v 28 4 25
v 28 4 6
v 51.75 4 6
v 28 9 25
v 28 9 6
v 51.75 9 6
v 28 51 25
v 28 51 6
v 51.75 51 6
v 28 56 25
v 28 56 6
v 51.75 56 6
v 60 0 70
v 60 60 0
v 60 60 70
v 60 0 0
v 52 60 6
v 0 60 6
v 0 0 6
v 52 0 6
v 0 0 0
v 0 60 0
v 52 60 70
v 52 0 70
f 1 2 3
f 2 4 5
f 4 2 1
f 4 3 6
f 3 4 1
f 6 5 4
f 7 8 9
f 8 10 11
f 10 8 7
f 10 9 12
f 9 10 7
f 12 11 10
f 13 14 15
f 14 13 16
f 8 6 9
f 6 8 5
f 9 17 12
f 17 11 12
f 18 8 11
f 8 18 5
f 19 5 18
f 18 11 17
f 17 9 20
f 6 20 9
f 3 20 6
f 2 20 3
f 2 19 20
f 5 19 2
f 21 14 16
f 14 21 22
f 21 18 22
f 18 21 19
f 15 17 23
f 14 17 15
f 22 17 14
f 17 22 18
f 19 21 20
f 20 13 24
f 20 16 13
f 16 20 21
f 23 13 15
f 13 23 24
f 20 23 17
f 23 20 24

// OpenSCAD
$fn = 32;

// ----------------------------------------------------------------------
// Rib bracket: 2-gusset L bracket
// ----------------------------------------------------------------------

// --- parameters (mm) ---
base_l = 60;              // foot length, X
base_w = 60;              // foot width, Y
base_t = 6;               // foot thickness
plate_t = 8;              // upright plate thickness
plate_h = 70;             // overall height
gus_l = 24;               // gusset leg along the foot
gus_h = 20;               // gusset height
gus_t = 5;                // gusset thickness
gus_edge = 4;             // gusset margin from the foot edge
n_gus = 2;                // gusset count

gus_pitch = (base_w - 2 * gus_edge - gus_t) / (n_gus - 1);  // gusset pitch

union() {
  cube([base_l, base_w, base_t]);
  translate([base_l - plate_t, 0, base_t - 1])
    cube([plate_t, base_w, plate_h - base_t + 1]);
  for (i = [0 : n_gus - 1])
    translate([base_l - plate_t - gus_l, gus_edge + i * gus_pitch, base_t - 1])
      rotate([-90, 0, 0])
        linear_extrude(height = gus_t)
          polygon(points = [[0, 0], [gus_l + 1, 0], [0, -gus_h]]);
}
